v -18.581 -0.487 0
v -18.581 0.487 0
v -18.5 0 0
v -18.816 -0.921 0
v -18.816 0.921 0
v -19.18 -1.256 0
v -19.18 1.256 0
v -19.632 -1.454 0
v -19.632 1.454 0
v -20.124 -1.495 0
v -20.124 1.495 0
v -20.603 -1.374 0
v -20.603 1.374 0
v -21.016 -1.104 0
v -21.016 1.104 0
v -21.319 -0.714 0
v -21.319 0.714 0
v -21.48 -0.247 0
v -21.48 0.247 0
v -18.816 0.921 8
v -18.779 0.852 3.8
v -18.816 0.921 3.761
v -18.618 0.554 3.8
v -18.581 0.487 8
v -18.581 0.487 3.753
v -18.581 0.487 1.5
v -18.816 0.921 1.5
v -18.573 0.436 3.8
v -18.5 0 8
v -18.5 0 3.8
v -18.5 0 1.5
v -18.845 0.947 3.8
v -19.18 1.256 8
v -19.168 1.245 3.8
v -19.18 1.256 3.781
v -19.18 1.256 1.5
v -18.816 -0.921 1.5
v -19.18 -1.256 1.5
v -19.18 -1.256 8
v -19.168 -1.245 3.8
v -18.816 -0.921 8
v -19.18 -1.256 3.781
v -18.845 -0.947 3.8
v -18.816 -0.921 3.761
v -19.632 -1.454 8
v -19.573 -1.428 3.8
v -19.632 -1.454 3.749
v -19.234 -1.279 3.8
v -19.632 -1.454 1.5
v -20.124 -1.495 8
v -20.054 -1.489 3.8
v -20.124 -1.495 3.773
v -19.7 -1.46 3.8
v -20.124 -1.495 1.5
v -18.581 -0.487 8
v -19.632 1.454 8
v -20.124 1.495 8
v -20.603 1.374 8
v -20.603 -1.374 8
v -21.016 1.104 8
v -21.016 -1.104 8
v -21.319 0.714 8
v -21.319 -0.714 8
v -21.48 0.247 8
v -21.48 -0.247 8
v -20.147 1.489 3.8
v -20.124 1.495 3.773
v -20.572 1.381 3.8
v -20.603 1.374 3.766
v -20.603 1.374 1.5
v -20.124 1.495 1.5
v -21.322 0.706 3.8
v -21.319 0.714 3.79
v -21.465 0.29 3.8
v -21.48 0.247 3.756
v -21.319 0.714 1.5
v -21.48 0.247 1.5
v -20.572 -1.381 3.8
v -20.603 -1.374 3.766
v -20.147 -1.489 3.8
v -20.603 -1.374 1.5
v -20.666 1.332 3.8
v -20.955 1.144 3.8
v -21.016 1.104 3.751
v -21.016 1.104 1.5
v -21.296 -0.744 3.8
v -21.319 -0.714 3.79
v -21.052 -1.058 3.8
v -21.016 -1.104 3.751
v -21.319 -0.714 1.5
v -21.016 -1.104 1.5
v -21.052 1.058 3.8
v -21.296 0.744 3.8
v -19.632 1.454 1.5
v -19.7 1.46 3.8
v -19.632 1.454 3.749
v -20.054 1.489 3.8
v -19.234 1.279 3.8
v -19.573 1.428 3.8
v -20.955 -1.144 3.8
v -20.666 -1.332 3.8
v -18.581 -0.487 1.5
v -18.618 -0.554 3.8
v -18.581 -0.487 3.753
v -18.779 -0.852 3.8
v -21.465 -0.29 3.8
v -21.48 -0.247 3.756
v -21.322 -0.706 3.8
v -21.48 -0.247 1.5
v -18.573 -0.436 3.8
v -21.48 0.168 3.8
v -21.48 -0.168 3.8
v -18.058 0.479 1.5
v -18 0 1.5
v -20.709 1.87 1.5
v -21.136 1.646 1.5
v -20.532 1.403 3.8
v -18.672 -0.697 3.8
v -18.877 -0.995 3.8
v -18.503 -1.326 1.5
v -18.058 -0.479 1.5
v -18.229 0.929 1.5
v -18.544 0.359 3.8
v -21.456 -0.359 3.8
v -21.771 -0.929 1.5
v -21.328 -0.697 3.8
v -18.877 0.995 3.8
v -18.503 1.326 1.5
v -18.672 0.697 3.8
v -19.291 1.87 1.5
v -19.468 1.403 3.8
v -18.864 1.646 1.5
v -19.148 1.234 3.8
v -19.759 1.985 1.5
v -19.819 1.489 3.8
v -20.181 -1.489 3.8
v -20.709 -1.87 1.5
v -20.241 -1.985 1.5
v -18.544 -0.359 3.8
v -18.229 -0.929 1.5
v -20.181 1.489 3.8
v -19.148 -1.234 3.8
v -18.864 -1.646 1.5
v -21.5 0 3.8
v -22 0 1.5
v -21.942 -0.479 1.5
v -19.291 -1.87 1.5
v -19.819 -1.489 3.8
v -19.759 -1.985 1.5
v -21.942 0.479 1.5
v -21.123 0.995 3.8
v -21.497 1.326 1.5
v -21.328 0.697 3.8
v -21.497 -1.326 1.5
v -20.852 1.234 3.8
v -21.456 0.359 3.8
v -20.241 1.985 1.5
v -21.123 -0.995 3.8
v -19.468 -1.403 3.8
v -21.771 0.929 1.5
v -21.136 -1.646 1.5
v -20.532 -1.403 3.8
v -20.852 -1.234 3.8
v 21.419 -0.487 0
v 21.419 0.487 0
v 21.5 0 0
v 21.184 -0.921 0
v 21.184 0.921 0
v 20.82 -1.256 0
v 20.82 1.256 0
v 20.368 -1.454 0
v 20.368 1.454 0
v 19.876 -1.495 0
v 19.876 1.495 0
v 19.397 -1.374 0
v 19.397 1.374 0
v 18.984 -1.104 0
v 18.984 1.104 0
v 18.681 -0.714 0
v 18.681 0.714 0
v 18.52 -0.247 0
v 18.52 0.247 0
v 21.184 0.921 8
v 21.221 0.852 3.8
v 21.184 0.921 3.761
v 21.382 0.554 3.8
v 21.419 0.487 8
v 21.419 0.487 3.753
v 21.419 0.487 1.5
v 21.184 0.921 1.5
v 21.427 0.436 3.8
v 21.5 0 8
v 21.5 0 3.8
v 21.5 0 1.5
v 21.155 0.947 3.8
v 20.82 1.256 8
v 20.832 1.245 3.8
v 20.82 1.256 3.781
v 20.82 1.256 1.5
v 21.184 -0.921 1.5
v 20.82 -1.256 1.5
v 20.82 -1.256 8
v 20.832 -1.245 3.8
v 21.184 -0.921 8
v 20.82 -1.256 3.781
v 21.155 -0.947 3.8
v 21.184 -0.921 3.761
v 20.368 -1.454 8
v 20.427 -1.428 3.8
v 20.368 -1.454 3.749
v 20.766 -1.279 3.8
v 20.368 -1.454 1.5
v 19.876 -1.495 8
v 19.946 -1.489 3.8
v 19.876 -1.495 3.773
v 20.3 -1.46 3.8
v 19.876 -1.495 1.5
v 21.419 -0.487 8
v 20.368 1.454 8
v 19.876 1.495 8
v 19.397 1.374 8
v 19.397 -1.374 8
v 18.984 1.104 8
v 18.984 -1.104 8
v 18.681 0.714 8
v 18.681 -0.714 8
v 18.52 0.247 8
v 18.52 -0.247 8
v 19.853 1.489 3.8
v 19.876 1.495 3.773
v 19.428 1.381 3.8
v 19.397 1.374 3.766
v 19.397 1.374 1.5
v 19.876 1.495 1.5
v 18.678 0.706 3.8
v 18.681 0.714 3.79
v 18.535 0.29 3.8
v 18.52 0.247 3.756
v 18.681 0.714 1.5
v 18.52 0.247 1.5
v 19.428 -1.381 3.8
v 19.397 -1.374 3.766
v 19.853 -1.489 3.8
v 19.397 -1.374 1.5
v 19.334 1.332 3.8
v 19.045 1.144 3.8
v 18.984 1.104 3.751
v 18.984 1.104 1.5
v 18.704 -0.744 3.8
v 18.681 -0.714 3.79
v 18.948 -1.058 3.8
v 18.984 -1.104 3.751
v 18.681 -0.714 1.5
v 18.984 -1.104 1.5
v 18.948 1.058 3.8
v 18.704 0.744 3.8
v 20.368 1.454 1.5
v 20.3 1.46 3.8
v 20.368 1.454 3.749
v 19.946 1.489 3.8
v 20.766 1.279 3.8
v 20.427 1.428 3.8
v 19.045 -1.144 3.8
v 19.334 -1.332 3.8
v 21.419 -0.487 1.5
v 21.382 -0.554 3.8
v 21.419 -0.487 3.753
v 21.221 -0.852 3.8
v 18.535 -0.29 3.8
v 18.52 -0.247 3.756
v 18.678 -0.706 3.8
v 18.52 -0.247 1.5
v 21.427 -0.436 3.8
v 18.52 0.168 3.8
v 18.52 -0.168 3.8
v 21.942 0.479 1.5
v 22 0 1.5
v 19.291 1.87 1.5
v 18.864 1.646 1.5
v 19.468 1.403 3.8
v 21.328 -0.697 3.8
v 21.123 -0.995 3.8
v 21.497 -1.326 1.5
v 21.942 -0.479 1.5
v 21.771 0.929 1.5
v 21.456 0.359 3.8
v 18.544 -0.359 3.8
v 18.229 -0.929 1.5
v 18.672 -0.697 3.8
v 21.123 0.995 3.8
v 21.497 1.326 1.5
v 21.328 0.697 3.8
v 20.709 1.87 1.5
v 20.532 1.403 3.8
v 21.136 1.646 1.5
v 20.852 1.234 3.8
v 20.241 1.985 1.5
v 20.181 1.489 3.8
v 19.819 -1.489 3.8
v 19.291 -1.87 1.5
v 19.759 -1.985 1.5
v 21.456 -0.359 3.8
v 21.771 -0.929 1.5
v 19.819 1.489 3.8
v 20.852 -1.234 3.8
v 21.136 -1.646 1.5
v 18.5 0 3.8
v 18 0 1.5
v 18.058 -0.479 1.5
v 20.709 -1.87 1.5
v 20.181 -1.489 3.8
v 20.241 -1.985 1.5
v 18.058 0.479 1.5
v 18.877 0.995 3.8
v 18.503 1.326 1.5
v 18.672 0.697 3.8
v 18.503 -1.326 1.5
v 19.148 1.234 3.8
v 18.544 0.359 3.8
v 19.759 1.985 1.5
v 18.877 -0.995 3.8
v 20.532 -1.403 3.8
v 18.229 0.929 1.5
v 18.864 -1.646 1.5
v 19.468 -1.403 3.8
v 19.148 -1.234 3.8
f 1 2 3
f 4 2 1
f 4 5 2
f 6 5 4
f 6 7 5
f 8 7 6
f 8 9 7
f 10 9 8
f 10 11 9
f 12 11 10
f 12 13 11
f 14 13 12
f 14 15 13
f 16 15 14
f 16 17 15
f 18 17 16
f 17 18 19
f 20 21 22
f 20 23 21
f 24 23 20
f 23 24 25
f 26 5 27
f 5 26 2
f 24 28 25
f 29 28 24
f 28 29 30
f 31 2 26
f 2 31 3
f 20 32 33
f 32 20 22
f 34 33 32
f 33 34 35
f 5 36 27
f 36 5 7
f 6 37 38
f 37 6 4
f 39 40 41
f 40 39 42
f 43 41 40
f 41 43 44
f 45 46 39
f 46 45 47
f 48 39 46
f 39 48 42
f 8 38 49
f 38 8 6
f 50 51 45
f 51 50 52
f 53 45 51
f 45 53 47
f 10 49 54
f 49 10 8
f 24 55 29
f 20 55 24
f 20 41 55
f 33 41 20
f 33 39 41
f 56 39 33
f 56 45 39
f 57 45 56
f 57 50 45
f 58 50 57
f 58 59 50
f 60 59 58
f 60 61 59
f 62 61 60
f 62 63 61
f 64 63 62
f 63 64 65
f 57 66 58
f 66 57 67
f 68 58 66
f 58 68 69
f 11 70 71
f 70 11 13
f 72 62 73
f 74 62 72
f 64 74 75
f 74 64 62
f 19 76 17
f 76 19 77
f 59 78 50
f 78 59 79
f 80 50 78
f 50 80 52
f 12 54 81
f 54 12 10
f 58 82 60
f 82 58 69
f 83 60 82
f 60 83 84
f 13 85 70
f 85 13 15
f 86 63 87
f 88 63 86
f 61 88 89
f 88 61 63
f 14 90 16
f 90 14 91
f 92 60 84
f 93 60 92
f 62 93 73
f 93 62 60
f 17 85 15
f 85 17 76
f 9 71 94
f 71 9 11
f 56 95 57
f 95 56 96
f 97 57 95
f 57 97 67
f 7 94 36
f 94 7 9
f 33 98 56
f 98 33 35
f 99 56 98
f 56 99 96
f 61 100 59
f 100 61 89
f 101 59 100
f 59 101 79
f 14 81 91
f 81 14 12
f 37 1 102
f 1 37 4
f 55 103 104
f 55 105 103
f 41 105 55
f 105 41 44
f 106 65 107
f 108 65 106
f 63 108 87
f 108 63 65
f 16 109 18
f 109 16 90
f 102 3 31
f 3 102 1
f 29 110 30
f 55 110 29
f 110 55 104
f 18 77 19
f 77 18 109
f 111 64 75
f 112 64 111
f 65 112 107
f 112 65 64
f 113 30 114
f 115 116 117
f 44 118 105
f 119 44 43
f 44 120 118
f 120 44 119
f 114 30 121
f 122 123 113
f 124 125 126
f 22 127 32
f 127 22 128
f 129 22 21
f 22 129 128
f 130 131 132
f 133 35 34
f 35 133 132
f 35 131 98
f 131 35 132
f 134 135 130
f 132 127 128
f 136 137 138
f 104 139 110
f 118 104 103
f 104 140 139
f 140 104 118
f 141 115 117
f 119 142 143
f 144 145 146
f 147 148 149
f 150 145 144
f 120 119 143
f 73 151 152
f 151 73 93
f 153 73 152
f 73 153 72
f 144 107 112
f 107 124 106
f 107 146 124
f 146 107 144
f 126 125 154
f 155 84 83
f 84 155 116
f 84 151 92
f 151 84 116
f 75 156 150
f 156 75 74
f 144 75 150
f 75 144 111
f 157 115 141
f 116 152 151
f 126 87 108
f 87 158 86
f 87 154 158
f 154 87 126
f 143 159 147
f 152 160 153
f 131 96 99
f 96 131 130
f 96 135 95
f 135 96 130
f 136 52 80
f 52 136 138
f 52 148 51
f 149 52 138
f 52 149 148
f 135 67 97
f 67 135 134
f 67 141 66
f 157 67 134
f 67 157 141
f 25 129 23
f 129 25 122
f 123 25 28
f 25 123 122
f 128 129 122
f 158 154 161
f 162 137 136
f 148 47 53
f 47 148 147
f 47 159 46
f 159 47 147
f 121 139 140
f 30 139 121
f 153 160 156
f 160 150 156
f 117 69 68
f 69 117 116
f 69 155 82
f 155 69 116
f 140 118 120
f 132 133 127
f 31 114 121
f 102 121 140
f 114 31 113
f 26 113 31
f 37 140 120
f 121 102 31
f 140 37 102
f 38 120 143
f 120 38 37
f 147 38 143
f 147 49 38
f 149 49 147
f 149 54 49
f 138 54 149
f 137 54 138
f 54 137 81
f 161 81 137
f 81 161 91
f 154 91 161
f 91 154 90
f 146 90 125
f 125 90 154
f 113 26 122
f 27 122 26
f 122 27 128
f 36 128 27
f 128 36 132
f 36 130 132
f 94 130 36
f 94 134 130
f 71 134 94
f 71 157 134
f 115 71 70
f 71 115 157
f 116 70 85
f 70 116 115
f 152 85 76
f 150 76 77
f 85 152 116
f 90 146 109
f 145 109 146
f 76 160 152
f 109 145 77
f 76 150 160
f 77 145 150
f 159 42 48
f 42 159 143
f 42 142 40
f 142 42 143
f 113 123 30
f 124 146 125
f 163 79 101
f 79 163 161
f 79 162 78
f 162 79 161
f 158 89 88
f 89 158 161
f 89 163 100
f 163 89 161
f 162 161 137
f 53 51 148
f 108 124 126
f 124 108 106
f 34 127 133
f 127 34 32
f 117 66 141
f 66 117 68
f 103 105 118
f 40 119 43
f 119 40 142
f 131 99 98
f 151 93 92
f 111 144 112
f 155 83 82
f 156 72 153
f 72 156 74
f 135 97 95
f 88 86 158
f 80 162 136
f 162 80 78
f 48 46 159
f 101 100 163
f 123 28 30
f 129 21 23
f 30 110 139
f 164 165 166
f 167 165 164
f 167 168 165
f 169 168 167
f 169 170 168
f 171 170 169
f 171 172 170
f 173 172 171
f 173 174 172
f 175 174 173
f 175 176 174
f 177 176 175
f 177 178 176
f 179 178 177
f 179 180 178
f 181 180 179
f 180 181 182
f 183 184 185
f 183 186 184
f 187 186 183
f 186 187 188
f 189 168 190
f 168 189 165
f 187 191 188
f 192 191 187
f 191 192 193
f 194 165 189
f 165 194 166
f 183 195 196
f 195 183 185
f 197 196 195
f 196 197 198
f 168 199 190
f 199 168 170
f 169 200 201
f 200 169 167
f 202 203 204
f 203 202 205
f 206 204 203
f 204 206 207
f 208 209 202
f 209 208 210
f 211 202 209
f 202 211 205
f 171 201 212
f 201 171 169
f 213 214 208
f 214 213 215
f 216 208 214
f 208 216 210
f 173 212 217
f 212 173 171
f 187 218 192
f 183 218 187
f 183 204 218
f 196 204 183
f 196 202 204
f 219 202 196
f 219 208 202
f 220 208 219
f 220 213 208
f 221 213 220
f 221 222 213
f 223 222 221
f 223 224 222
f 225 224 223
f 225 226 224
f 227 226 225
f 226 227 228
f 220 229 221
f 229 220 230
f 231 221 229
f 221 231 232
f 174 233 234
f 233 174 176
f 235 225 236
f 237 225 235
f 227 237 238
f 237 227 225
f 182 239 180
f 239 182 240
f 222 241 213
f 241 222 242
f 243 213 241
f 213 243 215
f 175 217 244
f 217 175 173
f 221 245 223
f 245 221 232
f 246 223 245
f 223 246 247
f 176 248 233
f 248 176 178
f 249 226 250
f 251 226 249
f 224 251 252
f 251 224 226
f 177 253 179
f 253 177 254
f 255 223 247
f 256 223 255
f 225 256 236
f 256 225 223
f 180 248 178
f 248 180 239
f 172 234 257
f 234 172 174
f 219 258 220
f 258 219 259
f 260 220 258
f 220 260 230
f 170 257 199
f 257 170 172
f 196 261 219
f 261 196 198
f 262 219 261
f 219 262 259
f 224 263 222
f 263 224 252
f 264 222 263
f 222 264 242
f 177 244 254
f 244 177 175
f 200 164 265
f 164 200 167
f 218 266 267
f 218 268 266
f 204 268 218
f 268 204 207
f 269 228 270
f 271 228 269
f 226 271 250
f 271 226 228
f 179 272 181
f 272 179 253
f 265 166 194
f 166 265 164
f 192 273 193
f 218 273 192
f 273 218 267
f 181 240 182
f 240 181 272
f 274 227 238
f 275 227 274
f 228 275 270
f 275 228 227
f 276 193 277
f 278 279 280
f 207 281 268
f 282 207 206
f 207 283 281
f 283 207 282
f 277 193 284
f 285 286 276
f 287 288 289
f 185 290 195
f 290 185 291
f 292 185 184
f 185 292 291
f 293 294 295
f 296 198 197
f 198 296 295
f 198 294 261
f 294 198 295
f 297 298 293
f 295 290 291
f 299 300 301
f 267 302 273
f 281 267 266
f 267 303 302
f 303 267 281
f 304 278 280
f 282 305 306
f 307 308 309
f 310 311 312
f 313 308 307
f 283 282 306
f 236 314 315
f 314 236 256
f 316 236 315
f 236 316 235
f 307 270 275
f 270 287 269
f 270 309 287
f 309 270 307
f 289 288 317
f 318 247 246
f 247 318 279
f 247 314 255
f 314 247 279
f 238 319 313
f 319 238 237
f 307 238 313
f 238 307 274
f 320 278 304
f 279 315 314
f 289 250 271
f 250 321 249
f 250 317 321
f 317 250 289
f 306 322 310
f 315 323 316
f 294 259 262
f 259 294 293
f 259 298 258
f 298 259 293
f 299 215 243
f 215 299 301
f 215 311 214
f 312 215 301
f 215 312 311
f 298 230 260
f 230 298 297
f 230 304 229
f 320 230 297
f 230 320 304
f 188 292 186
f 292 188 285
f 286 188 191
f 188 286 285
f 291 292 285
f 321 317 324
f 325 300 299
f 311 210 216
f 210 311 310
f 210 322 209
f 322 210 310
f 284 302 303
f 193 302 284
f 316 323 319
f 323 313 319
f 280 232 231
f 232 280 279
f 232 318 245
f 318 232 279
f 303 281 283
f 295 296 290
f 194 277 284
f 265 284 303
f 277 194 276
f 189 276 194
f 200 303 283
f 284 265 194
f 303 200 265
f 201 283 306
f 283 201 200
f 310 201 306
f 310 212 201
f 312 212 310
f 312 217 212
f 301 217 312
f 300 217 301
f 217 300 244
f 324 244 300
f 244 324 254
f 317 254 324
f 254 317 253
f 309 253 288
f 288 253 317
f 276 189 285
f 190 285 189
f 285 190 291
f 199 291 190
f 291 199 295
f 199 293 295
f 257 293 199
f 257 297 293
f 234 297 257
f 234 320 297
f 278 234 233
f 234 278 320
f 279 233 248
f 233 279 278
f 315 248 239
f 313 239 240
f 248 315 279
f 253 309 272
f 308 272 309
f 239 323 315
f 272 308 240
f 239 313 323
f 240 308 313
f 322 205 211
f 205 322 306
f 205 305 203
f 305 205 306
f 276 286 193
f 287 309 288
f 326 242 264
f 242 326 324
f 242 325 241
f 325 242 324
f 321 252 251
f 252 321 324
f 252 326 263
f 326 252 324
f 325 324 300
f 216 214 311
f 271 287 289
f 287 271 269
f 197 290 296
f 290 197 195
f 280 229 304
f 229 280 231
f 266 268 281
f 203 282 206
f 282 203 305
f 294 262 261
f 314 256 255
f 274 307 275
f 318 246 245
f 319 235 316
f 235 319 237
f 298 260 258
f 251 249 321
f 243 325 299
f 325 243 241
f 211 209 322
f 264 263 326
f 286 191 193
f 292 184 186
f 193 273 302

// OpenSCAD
// file: pico-cec-lib.scad
$fa = 1;
$fs = $preview ? 2 : 0.5;

module hdmi_2d_male() {
    union () {
        hull() {
            square([13.9, 2.8], true);
                translate([0,-(2.8+0.35)/2])
            square([11.45, 0.35], true);
        }
        hull () {
            translate([0,-(2.8+0.35)/2])
                square([11.45, 0.35], true);
            translate([0, -(4.45)/2])
                square([9.5, 1.3], true);
        }
    }
}

module hdmi_2d_female() {
    scale([15.0/13.9, 5.3/4.45])
        hdmi_2d_male();
}

module hdmi_male() {
    color("goldenrod") union() {
        linear_extrude(12.7)
            hdmi_2d_male();
        translate([0, -1, 12])
            cube([14.2, 5.0, 3],true);
    }
}

module hdmi_female() {
    color("red") linear_extrude(11.4)
        hdmi_2d_female();
}

module hdmi_adapter() {
    union() {
        color("green") difference() {
            cube([27.8, 29.6, 1.6], true);
            translate([11, (29.6/2) - 6, -1.5])
                cylinder(3, r=1.5);
            translate([-11, (29.6/2) - 6, -1.5])
                cylinder(3, r=1.5);
            translate([11, -((29.6/2) - 6), -1.5])
                cylinder(3, r=1.5);
            translate([-11, -((29.6/2) - 6), -1.5])
                cylinder(3, r=1.5);

        }
        translate([0, -(29.6/2), (4.45 - 2.8)/2])
            rotate([90, 0, 0])
                hdmi_female();
        translate([0, (29.6/2) + 12.7, (4.45 - 2.8)/2])
            rotate([90, 0, 0])
                hdmi_male();
    }
}

module usb_c_female() {
    color("silver") linear_extrude(7.2) {
        hull() {
            translate([4.55-1.6, 0, 0])
                circle(r=1.6);
            translate([-4.55+1.6, 0, 0])
                circle(r=1.6);
        }
    }
}

module xiao_rp2040() {
    union() {
        color("blue") cube([17.5, 21.0, 1.2]);
        translate([17.5/2, 5, 1.6+1.0])
            rotate([90,0,0])
                usb_c_female();
    }
}

module nut_m3() {
    cylinder(2.5, r=3.3, $fn=6);
}

module head_m3() {
    cylinder(2.5, r=3);
}

module base() {
    difference() {
        union() {
            difference() {
                cube([32, 40.5+1.5, 9], true);
                translate([0, 0, 1.5])
                    cube([32-3, 40.5+1.5-3, 9-1.5], true);
                translate([0, 4.1, 1.5])
                    hdmi_adapter();
                translate([0, 20, 5])
                    cube([14.1, 3, 3], true);
                translate([0, -20, 5])
                    cube([15.0, 3, 3], true);
            }
            // posts
            translate([11, 13.0, -4.5])
                cylinder(5, r=5);
            translate([11, -4.0, -4.5])
                cylinder(5, r=5);
            translate([-11, 13.0, -4.5])
                cylinder(5, r=5);
            translate([-11, -4.0, -4.5])
                cylinder(5, r=5);
        }
        // bolt
        translate([11, 13.0, -4.55])
            cylinder(5.1, r=1.6);
        translate([11, -4.0, -4.55])
            cylinder(5.1, r=1.6);
        translate([-11, 13.0, -4.55])
            cylinder(5.1, r=1.6);
        translate([-11, -4.0, -4.55])
            cylinder(5.1, r=1.6);
        // nuts
        translate([11, 13.0, -4.55])
            nut_m3();
        translate([11, -4.0, -4.55])
            nut_m3();
        translate([-11, 13.0, -4.55])
            nut_m3();
        translate([-11, -4.0, -4.55])
            nut_m3();
    }
}

module middle() {
    union() {
        difference() {
            cube([32, 40.5+1.5, 4], true);
            // bolt
            translate([11, 13.0, -2.55])
                cylinder(5.1, r=1.6);
            translate([11, -4.0, -2.55])
                cylinder(5.1, r=1.6);
            translate([-11, 13.0, -2.55])
                cylinder(5.1, r=1.6);
            translate([-11, -4.0, -2.55])
                cylinder(5.1, r=1.6);
            // head
            translate([-11, 13.0, -0.45])
                head_m3();
            translate([11, 13.0, -0.45])
                head_m3();
            // xiao rp2040 pins
            translate([7.5, -9.1, 0])
                cube([2.5, 21, 4.05], true);
            translate([-7.5, -9.1, 0])
                cube([2.5, 21, 4.05], true);
            // hdmi adapter pins
            translate([0, 4, 0])
                cube([27.8, 8, 4.05], true);
            translate([0, 0, 0])
                cube([15.0, 8, 4.05], true);
        }
        // usb-c port bottom half
        translate([0, -20.25, (4+2.9)/2])
            difference() {
                cube([20.5, 1.5, 2.9], true);
                translate([0, 5, 2.9/2 ])
                    rotate([90, 0, 0])
                        usb_c_female();
            }
         // side supports
         translate([-9.6, -14.5, (4+2.9)/2])
            cube([1.3, 12, 2.9], true);
         translate([9.6, -14.5, (4+2.9)/2])
            cube([1.3, 12, 2.9], true);
        }
}

module pusher() {
    union() {
      cylinder(h=8.0,r=1.5);
      translate([0, 0, 1.5])
          cylinder(h=4.6/2, r1=2.0, r2=1.5);
    }
}

module top() {
    difference() {
        cube([32,30, 9], true);
        translate([0, -2.5, -3])
            cube([32-3, 30-8.5, 9-3], true);
        translate([0, -13.25, -1.5 ])
            rotate([90, 0, 0])
                usb_c_female();
        translate([0, -14.05, -3])
            cube([20.5, 2, 3.05], true);
        // bolt
        translate([-11, 2, -0.5])
            cylinder(5.1, r=1.6);
        translate([11, 2, -0.5])
            cylinder(5.1, r=1.6);
        // head
        translate([-11, 2, 2.5])
            head_m3();
        translate([11, 2, 2.5])
            head_m3();

        // R button shaft
        translate([5.0, 7.5, -2.0])
            scale([1.15, 1.15, 1.1]) pusher();
        translate([5.0, 7.5, -5.0])
            cylinder(h=5,r=2.3);
        // B button shaft
        translate([-5.0, 7.5, -2.0])
            scale([1.15, 1.15, 1.1]) pusher();
        translate([-5.0, 7.5, -5.0])
            cylinder(h=5,r=2.3);

        // power led
        translate([-6, -10, -0.3])
            cylinder(5, r=1.5);

        // RGB led
        translate([0, 6, -0.3])
            cylinder(5, r=1.5);
    }
}

//base();
//middle();
//top();
// main file
include <pico-cec-lib.scad>

translate([-20, 0, 0]) pusher();
translate([20, 0, 0]) pusher();
